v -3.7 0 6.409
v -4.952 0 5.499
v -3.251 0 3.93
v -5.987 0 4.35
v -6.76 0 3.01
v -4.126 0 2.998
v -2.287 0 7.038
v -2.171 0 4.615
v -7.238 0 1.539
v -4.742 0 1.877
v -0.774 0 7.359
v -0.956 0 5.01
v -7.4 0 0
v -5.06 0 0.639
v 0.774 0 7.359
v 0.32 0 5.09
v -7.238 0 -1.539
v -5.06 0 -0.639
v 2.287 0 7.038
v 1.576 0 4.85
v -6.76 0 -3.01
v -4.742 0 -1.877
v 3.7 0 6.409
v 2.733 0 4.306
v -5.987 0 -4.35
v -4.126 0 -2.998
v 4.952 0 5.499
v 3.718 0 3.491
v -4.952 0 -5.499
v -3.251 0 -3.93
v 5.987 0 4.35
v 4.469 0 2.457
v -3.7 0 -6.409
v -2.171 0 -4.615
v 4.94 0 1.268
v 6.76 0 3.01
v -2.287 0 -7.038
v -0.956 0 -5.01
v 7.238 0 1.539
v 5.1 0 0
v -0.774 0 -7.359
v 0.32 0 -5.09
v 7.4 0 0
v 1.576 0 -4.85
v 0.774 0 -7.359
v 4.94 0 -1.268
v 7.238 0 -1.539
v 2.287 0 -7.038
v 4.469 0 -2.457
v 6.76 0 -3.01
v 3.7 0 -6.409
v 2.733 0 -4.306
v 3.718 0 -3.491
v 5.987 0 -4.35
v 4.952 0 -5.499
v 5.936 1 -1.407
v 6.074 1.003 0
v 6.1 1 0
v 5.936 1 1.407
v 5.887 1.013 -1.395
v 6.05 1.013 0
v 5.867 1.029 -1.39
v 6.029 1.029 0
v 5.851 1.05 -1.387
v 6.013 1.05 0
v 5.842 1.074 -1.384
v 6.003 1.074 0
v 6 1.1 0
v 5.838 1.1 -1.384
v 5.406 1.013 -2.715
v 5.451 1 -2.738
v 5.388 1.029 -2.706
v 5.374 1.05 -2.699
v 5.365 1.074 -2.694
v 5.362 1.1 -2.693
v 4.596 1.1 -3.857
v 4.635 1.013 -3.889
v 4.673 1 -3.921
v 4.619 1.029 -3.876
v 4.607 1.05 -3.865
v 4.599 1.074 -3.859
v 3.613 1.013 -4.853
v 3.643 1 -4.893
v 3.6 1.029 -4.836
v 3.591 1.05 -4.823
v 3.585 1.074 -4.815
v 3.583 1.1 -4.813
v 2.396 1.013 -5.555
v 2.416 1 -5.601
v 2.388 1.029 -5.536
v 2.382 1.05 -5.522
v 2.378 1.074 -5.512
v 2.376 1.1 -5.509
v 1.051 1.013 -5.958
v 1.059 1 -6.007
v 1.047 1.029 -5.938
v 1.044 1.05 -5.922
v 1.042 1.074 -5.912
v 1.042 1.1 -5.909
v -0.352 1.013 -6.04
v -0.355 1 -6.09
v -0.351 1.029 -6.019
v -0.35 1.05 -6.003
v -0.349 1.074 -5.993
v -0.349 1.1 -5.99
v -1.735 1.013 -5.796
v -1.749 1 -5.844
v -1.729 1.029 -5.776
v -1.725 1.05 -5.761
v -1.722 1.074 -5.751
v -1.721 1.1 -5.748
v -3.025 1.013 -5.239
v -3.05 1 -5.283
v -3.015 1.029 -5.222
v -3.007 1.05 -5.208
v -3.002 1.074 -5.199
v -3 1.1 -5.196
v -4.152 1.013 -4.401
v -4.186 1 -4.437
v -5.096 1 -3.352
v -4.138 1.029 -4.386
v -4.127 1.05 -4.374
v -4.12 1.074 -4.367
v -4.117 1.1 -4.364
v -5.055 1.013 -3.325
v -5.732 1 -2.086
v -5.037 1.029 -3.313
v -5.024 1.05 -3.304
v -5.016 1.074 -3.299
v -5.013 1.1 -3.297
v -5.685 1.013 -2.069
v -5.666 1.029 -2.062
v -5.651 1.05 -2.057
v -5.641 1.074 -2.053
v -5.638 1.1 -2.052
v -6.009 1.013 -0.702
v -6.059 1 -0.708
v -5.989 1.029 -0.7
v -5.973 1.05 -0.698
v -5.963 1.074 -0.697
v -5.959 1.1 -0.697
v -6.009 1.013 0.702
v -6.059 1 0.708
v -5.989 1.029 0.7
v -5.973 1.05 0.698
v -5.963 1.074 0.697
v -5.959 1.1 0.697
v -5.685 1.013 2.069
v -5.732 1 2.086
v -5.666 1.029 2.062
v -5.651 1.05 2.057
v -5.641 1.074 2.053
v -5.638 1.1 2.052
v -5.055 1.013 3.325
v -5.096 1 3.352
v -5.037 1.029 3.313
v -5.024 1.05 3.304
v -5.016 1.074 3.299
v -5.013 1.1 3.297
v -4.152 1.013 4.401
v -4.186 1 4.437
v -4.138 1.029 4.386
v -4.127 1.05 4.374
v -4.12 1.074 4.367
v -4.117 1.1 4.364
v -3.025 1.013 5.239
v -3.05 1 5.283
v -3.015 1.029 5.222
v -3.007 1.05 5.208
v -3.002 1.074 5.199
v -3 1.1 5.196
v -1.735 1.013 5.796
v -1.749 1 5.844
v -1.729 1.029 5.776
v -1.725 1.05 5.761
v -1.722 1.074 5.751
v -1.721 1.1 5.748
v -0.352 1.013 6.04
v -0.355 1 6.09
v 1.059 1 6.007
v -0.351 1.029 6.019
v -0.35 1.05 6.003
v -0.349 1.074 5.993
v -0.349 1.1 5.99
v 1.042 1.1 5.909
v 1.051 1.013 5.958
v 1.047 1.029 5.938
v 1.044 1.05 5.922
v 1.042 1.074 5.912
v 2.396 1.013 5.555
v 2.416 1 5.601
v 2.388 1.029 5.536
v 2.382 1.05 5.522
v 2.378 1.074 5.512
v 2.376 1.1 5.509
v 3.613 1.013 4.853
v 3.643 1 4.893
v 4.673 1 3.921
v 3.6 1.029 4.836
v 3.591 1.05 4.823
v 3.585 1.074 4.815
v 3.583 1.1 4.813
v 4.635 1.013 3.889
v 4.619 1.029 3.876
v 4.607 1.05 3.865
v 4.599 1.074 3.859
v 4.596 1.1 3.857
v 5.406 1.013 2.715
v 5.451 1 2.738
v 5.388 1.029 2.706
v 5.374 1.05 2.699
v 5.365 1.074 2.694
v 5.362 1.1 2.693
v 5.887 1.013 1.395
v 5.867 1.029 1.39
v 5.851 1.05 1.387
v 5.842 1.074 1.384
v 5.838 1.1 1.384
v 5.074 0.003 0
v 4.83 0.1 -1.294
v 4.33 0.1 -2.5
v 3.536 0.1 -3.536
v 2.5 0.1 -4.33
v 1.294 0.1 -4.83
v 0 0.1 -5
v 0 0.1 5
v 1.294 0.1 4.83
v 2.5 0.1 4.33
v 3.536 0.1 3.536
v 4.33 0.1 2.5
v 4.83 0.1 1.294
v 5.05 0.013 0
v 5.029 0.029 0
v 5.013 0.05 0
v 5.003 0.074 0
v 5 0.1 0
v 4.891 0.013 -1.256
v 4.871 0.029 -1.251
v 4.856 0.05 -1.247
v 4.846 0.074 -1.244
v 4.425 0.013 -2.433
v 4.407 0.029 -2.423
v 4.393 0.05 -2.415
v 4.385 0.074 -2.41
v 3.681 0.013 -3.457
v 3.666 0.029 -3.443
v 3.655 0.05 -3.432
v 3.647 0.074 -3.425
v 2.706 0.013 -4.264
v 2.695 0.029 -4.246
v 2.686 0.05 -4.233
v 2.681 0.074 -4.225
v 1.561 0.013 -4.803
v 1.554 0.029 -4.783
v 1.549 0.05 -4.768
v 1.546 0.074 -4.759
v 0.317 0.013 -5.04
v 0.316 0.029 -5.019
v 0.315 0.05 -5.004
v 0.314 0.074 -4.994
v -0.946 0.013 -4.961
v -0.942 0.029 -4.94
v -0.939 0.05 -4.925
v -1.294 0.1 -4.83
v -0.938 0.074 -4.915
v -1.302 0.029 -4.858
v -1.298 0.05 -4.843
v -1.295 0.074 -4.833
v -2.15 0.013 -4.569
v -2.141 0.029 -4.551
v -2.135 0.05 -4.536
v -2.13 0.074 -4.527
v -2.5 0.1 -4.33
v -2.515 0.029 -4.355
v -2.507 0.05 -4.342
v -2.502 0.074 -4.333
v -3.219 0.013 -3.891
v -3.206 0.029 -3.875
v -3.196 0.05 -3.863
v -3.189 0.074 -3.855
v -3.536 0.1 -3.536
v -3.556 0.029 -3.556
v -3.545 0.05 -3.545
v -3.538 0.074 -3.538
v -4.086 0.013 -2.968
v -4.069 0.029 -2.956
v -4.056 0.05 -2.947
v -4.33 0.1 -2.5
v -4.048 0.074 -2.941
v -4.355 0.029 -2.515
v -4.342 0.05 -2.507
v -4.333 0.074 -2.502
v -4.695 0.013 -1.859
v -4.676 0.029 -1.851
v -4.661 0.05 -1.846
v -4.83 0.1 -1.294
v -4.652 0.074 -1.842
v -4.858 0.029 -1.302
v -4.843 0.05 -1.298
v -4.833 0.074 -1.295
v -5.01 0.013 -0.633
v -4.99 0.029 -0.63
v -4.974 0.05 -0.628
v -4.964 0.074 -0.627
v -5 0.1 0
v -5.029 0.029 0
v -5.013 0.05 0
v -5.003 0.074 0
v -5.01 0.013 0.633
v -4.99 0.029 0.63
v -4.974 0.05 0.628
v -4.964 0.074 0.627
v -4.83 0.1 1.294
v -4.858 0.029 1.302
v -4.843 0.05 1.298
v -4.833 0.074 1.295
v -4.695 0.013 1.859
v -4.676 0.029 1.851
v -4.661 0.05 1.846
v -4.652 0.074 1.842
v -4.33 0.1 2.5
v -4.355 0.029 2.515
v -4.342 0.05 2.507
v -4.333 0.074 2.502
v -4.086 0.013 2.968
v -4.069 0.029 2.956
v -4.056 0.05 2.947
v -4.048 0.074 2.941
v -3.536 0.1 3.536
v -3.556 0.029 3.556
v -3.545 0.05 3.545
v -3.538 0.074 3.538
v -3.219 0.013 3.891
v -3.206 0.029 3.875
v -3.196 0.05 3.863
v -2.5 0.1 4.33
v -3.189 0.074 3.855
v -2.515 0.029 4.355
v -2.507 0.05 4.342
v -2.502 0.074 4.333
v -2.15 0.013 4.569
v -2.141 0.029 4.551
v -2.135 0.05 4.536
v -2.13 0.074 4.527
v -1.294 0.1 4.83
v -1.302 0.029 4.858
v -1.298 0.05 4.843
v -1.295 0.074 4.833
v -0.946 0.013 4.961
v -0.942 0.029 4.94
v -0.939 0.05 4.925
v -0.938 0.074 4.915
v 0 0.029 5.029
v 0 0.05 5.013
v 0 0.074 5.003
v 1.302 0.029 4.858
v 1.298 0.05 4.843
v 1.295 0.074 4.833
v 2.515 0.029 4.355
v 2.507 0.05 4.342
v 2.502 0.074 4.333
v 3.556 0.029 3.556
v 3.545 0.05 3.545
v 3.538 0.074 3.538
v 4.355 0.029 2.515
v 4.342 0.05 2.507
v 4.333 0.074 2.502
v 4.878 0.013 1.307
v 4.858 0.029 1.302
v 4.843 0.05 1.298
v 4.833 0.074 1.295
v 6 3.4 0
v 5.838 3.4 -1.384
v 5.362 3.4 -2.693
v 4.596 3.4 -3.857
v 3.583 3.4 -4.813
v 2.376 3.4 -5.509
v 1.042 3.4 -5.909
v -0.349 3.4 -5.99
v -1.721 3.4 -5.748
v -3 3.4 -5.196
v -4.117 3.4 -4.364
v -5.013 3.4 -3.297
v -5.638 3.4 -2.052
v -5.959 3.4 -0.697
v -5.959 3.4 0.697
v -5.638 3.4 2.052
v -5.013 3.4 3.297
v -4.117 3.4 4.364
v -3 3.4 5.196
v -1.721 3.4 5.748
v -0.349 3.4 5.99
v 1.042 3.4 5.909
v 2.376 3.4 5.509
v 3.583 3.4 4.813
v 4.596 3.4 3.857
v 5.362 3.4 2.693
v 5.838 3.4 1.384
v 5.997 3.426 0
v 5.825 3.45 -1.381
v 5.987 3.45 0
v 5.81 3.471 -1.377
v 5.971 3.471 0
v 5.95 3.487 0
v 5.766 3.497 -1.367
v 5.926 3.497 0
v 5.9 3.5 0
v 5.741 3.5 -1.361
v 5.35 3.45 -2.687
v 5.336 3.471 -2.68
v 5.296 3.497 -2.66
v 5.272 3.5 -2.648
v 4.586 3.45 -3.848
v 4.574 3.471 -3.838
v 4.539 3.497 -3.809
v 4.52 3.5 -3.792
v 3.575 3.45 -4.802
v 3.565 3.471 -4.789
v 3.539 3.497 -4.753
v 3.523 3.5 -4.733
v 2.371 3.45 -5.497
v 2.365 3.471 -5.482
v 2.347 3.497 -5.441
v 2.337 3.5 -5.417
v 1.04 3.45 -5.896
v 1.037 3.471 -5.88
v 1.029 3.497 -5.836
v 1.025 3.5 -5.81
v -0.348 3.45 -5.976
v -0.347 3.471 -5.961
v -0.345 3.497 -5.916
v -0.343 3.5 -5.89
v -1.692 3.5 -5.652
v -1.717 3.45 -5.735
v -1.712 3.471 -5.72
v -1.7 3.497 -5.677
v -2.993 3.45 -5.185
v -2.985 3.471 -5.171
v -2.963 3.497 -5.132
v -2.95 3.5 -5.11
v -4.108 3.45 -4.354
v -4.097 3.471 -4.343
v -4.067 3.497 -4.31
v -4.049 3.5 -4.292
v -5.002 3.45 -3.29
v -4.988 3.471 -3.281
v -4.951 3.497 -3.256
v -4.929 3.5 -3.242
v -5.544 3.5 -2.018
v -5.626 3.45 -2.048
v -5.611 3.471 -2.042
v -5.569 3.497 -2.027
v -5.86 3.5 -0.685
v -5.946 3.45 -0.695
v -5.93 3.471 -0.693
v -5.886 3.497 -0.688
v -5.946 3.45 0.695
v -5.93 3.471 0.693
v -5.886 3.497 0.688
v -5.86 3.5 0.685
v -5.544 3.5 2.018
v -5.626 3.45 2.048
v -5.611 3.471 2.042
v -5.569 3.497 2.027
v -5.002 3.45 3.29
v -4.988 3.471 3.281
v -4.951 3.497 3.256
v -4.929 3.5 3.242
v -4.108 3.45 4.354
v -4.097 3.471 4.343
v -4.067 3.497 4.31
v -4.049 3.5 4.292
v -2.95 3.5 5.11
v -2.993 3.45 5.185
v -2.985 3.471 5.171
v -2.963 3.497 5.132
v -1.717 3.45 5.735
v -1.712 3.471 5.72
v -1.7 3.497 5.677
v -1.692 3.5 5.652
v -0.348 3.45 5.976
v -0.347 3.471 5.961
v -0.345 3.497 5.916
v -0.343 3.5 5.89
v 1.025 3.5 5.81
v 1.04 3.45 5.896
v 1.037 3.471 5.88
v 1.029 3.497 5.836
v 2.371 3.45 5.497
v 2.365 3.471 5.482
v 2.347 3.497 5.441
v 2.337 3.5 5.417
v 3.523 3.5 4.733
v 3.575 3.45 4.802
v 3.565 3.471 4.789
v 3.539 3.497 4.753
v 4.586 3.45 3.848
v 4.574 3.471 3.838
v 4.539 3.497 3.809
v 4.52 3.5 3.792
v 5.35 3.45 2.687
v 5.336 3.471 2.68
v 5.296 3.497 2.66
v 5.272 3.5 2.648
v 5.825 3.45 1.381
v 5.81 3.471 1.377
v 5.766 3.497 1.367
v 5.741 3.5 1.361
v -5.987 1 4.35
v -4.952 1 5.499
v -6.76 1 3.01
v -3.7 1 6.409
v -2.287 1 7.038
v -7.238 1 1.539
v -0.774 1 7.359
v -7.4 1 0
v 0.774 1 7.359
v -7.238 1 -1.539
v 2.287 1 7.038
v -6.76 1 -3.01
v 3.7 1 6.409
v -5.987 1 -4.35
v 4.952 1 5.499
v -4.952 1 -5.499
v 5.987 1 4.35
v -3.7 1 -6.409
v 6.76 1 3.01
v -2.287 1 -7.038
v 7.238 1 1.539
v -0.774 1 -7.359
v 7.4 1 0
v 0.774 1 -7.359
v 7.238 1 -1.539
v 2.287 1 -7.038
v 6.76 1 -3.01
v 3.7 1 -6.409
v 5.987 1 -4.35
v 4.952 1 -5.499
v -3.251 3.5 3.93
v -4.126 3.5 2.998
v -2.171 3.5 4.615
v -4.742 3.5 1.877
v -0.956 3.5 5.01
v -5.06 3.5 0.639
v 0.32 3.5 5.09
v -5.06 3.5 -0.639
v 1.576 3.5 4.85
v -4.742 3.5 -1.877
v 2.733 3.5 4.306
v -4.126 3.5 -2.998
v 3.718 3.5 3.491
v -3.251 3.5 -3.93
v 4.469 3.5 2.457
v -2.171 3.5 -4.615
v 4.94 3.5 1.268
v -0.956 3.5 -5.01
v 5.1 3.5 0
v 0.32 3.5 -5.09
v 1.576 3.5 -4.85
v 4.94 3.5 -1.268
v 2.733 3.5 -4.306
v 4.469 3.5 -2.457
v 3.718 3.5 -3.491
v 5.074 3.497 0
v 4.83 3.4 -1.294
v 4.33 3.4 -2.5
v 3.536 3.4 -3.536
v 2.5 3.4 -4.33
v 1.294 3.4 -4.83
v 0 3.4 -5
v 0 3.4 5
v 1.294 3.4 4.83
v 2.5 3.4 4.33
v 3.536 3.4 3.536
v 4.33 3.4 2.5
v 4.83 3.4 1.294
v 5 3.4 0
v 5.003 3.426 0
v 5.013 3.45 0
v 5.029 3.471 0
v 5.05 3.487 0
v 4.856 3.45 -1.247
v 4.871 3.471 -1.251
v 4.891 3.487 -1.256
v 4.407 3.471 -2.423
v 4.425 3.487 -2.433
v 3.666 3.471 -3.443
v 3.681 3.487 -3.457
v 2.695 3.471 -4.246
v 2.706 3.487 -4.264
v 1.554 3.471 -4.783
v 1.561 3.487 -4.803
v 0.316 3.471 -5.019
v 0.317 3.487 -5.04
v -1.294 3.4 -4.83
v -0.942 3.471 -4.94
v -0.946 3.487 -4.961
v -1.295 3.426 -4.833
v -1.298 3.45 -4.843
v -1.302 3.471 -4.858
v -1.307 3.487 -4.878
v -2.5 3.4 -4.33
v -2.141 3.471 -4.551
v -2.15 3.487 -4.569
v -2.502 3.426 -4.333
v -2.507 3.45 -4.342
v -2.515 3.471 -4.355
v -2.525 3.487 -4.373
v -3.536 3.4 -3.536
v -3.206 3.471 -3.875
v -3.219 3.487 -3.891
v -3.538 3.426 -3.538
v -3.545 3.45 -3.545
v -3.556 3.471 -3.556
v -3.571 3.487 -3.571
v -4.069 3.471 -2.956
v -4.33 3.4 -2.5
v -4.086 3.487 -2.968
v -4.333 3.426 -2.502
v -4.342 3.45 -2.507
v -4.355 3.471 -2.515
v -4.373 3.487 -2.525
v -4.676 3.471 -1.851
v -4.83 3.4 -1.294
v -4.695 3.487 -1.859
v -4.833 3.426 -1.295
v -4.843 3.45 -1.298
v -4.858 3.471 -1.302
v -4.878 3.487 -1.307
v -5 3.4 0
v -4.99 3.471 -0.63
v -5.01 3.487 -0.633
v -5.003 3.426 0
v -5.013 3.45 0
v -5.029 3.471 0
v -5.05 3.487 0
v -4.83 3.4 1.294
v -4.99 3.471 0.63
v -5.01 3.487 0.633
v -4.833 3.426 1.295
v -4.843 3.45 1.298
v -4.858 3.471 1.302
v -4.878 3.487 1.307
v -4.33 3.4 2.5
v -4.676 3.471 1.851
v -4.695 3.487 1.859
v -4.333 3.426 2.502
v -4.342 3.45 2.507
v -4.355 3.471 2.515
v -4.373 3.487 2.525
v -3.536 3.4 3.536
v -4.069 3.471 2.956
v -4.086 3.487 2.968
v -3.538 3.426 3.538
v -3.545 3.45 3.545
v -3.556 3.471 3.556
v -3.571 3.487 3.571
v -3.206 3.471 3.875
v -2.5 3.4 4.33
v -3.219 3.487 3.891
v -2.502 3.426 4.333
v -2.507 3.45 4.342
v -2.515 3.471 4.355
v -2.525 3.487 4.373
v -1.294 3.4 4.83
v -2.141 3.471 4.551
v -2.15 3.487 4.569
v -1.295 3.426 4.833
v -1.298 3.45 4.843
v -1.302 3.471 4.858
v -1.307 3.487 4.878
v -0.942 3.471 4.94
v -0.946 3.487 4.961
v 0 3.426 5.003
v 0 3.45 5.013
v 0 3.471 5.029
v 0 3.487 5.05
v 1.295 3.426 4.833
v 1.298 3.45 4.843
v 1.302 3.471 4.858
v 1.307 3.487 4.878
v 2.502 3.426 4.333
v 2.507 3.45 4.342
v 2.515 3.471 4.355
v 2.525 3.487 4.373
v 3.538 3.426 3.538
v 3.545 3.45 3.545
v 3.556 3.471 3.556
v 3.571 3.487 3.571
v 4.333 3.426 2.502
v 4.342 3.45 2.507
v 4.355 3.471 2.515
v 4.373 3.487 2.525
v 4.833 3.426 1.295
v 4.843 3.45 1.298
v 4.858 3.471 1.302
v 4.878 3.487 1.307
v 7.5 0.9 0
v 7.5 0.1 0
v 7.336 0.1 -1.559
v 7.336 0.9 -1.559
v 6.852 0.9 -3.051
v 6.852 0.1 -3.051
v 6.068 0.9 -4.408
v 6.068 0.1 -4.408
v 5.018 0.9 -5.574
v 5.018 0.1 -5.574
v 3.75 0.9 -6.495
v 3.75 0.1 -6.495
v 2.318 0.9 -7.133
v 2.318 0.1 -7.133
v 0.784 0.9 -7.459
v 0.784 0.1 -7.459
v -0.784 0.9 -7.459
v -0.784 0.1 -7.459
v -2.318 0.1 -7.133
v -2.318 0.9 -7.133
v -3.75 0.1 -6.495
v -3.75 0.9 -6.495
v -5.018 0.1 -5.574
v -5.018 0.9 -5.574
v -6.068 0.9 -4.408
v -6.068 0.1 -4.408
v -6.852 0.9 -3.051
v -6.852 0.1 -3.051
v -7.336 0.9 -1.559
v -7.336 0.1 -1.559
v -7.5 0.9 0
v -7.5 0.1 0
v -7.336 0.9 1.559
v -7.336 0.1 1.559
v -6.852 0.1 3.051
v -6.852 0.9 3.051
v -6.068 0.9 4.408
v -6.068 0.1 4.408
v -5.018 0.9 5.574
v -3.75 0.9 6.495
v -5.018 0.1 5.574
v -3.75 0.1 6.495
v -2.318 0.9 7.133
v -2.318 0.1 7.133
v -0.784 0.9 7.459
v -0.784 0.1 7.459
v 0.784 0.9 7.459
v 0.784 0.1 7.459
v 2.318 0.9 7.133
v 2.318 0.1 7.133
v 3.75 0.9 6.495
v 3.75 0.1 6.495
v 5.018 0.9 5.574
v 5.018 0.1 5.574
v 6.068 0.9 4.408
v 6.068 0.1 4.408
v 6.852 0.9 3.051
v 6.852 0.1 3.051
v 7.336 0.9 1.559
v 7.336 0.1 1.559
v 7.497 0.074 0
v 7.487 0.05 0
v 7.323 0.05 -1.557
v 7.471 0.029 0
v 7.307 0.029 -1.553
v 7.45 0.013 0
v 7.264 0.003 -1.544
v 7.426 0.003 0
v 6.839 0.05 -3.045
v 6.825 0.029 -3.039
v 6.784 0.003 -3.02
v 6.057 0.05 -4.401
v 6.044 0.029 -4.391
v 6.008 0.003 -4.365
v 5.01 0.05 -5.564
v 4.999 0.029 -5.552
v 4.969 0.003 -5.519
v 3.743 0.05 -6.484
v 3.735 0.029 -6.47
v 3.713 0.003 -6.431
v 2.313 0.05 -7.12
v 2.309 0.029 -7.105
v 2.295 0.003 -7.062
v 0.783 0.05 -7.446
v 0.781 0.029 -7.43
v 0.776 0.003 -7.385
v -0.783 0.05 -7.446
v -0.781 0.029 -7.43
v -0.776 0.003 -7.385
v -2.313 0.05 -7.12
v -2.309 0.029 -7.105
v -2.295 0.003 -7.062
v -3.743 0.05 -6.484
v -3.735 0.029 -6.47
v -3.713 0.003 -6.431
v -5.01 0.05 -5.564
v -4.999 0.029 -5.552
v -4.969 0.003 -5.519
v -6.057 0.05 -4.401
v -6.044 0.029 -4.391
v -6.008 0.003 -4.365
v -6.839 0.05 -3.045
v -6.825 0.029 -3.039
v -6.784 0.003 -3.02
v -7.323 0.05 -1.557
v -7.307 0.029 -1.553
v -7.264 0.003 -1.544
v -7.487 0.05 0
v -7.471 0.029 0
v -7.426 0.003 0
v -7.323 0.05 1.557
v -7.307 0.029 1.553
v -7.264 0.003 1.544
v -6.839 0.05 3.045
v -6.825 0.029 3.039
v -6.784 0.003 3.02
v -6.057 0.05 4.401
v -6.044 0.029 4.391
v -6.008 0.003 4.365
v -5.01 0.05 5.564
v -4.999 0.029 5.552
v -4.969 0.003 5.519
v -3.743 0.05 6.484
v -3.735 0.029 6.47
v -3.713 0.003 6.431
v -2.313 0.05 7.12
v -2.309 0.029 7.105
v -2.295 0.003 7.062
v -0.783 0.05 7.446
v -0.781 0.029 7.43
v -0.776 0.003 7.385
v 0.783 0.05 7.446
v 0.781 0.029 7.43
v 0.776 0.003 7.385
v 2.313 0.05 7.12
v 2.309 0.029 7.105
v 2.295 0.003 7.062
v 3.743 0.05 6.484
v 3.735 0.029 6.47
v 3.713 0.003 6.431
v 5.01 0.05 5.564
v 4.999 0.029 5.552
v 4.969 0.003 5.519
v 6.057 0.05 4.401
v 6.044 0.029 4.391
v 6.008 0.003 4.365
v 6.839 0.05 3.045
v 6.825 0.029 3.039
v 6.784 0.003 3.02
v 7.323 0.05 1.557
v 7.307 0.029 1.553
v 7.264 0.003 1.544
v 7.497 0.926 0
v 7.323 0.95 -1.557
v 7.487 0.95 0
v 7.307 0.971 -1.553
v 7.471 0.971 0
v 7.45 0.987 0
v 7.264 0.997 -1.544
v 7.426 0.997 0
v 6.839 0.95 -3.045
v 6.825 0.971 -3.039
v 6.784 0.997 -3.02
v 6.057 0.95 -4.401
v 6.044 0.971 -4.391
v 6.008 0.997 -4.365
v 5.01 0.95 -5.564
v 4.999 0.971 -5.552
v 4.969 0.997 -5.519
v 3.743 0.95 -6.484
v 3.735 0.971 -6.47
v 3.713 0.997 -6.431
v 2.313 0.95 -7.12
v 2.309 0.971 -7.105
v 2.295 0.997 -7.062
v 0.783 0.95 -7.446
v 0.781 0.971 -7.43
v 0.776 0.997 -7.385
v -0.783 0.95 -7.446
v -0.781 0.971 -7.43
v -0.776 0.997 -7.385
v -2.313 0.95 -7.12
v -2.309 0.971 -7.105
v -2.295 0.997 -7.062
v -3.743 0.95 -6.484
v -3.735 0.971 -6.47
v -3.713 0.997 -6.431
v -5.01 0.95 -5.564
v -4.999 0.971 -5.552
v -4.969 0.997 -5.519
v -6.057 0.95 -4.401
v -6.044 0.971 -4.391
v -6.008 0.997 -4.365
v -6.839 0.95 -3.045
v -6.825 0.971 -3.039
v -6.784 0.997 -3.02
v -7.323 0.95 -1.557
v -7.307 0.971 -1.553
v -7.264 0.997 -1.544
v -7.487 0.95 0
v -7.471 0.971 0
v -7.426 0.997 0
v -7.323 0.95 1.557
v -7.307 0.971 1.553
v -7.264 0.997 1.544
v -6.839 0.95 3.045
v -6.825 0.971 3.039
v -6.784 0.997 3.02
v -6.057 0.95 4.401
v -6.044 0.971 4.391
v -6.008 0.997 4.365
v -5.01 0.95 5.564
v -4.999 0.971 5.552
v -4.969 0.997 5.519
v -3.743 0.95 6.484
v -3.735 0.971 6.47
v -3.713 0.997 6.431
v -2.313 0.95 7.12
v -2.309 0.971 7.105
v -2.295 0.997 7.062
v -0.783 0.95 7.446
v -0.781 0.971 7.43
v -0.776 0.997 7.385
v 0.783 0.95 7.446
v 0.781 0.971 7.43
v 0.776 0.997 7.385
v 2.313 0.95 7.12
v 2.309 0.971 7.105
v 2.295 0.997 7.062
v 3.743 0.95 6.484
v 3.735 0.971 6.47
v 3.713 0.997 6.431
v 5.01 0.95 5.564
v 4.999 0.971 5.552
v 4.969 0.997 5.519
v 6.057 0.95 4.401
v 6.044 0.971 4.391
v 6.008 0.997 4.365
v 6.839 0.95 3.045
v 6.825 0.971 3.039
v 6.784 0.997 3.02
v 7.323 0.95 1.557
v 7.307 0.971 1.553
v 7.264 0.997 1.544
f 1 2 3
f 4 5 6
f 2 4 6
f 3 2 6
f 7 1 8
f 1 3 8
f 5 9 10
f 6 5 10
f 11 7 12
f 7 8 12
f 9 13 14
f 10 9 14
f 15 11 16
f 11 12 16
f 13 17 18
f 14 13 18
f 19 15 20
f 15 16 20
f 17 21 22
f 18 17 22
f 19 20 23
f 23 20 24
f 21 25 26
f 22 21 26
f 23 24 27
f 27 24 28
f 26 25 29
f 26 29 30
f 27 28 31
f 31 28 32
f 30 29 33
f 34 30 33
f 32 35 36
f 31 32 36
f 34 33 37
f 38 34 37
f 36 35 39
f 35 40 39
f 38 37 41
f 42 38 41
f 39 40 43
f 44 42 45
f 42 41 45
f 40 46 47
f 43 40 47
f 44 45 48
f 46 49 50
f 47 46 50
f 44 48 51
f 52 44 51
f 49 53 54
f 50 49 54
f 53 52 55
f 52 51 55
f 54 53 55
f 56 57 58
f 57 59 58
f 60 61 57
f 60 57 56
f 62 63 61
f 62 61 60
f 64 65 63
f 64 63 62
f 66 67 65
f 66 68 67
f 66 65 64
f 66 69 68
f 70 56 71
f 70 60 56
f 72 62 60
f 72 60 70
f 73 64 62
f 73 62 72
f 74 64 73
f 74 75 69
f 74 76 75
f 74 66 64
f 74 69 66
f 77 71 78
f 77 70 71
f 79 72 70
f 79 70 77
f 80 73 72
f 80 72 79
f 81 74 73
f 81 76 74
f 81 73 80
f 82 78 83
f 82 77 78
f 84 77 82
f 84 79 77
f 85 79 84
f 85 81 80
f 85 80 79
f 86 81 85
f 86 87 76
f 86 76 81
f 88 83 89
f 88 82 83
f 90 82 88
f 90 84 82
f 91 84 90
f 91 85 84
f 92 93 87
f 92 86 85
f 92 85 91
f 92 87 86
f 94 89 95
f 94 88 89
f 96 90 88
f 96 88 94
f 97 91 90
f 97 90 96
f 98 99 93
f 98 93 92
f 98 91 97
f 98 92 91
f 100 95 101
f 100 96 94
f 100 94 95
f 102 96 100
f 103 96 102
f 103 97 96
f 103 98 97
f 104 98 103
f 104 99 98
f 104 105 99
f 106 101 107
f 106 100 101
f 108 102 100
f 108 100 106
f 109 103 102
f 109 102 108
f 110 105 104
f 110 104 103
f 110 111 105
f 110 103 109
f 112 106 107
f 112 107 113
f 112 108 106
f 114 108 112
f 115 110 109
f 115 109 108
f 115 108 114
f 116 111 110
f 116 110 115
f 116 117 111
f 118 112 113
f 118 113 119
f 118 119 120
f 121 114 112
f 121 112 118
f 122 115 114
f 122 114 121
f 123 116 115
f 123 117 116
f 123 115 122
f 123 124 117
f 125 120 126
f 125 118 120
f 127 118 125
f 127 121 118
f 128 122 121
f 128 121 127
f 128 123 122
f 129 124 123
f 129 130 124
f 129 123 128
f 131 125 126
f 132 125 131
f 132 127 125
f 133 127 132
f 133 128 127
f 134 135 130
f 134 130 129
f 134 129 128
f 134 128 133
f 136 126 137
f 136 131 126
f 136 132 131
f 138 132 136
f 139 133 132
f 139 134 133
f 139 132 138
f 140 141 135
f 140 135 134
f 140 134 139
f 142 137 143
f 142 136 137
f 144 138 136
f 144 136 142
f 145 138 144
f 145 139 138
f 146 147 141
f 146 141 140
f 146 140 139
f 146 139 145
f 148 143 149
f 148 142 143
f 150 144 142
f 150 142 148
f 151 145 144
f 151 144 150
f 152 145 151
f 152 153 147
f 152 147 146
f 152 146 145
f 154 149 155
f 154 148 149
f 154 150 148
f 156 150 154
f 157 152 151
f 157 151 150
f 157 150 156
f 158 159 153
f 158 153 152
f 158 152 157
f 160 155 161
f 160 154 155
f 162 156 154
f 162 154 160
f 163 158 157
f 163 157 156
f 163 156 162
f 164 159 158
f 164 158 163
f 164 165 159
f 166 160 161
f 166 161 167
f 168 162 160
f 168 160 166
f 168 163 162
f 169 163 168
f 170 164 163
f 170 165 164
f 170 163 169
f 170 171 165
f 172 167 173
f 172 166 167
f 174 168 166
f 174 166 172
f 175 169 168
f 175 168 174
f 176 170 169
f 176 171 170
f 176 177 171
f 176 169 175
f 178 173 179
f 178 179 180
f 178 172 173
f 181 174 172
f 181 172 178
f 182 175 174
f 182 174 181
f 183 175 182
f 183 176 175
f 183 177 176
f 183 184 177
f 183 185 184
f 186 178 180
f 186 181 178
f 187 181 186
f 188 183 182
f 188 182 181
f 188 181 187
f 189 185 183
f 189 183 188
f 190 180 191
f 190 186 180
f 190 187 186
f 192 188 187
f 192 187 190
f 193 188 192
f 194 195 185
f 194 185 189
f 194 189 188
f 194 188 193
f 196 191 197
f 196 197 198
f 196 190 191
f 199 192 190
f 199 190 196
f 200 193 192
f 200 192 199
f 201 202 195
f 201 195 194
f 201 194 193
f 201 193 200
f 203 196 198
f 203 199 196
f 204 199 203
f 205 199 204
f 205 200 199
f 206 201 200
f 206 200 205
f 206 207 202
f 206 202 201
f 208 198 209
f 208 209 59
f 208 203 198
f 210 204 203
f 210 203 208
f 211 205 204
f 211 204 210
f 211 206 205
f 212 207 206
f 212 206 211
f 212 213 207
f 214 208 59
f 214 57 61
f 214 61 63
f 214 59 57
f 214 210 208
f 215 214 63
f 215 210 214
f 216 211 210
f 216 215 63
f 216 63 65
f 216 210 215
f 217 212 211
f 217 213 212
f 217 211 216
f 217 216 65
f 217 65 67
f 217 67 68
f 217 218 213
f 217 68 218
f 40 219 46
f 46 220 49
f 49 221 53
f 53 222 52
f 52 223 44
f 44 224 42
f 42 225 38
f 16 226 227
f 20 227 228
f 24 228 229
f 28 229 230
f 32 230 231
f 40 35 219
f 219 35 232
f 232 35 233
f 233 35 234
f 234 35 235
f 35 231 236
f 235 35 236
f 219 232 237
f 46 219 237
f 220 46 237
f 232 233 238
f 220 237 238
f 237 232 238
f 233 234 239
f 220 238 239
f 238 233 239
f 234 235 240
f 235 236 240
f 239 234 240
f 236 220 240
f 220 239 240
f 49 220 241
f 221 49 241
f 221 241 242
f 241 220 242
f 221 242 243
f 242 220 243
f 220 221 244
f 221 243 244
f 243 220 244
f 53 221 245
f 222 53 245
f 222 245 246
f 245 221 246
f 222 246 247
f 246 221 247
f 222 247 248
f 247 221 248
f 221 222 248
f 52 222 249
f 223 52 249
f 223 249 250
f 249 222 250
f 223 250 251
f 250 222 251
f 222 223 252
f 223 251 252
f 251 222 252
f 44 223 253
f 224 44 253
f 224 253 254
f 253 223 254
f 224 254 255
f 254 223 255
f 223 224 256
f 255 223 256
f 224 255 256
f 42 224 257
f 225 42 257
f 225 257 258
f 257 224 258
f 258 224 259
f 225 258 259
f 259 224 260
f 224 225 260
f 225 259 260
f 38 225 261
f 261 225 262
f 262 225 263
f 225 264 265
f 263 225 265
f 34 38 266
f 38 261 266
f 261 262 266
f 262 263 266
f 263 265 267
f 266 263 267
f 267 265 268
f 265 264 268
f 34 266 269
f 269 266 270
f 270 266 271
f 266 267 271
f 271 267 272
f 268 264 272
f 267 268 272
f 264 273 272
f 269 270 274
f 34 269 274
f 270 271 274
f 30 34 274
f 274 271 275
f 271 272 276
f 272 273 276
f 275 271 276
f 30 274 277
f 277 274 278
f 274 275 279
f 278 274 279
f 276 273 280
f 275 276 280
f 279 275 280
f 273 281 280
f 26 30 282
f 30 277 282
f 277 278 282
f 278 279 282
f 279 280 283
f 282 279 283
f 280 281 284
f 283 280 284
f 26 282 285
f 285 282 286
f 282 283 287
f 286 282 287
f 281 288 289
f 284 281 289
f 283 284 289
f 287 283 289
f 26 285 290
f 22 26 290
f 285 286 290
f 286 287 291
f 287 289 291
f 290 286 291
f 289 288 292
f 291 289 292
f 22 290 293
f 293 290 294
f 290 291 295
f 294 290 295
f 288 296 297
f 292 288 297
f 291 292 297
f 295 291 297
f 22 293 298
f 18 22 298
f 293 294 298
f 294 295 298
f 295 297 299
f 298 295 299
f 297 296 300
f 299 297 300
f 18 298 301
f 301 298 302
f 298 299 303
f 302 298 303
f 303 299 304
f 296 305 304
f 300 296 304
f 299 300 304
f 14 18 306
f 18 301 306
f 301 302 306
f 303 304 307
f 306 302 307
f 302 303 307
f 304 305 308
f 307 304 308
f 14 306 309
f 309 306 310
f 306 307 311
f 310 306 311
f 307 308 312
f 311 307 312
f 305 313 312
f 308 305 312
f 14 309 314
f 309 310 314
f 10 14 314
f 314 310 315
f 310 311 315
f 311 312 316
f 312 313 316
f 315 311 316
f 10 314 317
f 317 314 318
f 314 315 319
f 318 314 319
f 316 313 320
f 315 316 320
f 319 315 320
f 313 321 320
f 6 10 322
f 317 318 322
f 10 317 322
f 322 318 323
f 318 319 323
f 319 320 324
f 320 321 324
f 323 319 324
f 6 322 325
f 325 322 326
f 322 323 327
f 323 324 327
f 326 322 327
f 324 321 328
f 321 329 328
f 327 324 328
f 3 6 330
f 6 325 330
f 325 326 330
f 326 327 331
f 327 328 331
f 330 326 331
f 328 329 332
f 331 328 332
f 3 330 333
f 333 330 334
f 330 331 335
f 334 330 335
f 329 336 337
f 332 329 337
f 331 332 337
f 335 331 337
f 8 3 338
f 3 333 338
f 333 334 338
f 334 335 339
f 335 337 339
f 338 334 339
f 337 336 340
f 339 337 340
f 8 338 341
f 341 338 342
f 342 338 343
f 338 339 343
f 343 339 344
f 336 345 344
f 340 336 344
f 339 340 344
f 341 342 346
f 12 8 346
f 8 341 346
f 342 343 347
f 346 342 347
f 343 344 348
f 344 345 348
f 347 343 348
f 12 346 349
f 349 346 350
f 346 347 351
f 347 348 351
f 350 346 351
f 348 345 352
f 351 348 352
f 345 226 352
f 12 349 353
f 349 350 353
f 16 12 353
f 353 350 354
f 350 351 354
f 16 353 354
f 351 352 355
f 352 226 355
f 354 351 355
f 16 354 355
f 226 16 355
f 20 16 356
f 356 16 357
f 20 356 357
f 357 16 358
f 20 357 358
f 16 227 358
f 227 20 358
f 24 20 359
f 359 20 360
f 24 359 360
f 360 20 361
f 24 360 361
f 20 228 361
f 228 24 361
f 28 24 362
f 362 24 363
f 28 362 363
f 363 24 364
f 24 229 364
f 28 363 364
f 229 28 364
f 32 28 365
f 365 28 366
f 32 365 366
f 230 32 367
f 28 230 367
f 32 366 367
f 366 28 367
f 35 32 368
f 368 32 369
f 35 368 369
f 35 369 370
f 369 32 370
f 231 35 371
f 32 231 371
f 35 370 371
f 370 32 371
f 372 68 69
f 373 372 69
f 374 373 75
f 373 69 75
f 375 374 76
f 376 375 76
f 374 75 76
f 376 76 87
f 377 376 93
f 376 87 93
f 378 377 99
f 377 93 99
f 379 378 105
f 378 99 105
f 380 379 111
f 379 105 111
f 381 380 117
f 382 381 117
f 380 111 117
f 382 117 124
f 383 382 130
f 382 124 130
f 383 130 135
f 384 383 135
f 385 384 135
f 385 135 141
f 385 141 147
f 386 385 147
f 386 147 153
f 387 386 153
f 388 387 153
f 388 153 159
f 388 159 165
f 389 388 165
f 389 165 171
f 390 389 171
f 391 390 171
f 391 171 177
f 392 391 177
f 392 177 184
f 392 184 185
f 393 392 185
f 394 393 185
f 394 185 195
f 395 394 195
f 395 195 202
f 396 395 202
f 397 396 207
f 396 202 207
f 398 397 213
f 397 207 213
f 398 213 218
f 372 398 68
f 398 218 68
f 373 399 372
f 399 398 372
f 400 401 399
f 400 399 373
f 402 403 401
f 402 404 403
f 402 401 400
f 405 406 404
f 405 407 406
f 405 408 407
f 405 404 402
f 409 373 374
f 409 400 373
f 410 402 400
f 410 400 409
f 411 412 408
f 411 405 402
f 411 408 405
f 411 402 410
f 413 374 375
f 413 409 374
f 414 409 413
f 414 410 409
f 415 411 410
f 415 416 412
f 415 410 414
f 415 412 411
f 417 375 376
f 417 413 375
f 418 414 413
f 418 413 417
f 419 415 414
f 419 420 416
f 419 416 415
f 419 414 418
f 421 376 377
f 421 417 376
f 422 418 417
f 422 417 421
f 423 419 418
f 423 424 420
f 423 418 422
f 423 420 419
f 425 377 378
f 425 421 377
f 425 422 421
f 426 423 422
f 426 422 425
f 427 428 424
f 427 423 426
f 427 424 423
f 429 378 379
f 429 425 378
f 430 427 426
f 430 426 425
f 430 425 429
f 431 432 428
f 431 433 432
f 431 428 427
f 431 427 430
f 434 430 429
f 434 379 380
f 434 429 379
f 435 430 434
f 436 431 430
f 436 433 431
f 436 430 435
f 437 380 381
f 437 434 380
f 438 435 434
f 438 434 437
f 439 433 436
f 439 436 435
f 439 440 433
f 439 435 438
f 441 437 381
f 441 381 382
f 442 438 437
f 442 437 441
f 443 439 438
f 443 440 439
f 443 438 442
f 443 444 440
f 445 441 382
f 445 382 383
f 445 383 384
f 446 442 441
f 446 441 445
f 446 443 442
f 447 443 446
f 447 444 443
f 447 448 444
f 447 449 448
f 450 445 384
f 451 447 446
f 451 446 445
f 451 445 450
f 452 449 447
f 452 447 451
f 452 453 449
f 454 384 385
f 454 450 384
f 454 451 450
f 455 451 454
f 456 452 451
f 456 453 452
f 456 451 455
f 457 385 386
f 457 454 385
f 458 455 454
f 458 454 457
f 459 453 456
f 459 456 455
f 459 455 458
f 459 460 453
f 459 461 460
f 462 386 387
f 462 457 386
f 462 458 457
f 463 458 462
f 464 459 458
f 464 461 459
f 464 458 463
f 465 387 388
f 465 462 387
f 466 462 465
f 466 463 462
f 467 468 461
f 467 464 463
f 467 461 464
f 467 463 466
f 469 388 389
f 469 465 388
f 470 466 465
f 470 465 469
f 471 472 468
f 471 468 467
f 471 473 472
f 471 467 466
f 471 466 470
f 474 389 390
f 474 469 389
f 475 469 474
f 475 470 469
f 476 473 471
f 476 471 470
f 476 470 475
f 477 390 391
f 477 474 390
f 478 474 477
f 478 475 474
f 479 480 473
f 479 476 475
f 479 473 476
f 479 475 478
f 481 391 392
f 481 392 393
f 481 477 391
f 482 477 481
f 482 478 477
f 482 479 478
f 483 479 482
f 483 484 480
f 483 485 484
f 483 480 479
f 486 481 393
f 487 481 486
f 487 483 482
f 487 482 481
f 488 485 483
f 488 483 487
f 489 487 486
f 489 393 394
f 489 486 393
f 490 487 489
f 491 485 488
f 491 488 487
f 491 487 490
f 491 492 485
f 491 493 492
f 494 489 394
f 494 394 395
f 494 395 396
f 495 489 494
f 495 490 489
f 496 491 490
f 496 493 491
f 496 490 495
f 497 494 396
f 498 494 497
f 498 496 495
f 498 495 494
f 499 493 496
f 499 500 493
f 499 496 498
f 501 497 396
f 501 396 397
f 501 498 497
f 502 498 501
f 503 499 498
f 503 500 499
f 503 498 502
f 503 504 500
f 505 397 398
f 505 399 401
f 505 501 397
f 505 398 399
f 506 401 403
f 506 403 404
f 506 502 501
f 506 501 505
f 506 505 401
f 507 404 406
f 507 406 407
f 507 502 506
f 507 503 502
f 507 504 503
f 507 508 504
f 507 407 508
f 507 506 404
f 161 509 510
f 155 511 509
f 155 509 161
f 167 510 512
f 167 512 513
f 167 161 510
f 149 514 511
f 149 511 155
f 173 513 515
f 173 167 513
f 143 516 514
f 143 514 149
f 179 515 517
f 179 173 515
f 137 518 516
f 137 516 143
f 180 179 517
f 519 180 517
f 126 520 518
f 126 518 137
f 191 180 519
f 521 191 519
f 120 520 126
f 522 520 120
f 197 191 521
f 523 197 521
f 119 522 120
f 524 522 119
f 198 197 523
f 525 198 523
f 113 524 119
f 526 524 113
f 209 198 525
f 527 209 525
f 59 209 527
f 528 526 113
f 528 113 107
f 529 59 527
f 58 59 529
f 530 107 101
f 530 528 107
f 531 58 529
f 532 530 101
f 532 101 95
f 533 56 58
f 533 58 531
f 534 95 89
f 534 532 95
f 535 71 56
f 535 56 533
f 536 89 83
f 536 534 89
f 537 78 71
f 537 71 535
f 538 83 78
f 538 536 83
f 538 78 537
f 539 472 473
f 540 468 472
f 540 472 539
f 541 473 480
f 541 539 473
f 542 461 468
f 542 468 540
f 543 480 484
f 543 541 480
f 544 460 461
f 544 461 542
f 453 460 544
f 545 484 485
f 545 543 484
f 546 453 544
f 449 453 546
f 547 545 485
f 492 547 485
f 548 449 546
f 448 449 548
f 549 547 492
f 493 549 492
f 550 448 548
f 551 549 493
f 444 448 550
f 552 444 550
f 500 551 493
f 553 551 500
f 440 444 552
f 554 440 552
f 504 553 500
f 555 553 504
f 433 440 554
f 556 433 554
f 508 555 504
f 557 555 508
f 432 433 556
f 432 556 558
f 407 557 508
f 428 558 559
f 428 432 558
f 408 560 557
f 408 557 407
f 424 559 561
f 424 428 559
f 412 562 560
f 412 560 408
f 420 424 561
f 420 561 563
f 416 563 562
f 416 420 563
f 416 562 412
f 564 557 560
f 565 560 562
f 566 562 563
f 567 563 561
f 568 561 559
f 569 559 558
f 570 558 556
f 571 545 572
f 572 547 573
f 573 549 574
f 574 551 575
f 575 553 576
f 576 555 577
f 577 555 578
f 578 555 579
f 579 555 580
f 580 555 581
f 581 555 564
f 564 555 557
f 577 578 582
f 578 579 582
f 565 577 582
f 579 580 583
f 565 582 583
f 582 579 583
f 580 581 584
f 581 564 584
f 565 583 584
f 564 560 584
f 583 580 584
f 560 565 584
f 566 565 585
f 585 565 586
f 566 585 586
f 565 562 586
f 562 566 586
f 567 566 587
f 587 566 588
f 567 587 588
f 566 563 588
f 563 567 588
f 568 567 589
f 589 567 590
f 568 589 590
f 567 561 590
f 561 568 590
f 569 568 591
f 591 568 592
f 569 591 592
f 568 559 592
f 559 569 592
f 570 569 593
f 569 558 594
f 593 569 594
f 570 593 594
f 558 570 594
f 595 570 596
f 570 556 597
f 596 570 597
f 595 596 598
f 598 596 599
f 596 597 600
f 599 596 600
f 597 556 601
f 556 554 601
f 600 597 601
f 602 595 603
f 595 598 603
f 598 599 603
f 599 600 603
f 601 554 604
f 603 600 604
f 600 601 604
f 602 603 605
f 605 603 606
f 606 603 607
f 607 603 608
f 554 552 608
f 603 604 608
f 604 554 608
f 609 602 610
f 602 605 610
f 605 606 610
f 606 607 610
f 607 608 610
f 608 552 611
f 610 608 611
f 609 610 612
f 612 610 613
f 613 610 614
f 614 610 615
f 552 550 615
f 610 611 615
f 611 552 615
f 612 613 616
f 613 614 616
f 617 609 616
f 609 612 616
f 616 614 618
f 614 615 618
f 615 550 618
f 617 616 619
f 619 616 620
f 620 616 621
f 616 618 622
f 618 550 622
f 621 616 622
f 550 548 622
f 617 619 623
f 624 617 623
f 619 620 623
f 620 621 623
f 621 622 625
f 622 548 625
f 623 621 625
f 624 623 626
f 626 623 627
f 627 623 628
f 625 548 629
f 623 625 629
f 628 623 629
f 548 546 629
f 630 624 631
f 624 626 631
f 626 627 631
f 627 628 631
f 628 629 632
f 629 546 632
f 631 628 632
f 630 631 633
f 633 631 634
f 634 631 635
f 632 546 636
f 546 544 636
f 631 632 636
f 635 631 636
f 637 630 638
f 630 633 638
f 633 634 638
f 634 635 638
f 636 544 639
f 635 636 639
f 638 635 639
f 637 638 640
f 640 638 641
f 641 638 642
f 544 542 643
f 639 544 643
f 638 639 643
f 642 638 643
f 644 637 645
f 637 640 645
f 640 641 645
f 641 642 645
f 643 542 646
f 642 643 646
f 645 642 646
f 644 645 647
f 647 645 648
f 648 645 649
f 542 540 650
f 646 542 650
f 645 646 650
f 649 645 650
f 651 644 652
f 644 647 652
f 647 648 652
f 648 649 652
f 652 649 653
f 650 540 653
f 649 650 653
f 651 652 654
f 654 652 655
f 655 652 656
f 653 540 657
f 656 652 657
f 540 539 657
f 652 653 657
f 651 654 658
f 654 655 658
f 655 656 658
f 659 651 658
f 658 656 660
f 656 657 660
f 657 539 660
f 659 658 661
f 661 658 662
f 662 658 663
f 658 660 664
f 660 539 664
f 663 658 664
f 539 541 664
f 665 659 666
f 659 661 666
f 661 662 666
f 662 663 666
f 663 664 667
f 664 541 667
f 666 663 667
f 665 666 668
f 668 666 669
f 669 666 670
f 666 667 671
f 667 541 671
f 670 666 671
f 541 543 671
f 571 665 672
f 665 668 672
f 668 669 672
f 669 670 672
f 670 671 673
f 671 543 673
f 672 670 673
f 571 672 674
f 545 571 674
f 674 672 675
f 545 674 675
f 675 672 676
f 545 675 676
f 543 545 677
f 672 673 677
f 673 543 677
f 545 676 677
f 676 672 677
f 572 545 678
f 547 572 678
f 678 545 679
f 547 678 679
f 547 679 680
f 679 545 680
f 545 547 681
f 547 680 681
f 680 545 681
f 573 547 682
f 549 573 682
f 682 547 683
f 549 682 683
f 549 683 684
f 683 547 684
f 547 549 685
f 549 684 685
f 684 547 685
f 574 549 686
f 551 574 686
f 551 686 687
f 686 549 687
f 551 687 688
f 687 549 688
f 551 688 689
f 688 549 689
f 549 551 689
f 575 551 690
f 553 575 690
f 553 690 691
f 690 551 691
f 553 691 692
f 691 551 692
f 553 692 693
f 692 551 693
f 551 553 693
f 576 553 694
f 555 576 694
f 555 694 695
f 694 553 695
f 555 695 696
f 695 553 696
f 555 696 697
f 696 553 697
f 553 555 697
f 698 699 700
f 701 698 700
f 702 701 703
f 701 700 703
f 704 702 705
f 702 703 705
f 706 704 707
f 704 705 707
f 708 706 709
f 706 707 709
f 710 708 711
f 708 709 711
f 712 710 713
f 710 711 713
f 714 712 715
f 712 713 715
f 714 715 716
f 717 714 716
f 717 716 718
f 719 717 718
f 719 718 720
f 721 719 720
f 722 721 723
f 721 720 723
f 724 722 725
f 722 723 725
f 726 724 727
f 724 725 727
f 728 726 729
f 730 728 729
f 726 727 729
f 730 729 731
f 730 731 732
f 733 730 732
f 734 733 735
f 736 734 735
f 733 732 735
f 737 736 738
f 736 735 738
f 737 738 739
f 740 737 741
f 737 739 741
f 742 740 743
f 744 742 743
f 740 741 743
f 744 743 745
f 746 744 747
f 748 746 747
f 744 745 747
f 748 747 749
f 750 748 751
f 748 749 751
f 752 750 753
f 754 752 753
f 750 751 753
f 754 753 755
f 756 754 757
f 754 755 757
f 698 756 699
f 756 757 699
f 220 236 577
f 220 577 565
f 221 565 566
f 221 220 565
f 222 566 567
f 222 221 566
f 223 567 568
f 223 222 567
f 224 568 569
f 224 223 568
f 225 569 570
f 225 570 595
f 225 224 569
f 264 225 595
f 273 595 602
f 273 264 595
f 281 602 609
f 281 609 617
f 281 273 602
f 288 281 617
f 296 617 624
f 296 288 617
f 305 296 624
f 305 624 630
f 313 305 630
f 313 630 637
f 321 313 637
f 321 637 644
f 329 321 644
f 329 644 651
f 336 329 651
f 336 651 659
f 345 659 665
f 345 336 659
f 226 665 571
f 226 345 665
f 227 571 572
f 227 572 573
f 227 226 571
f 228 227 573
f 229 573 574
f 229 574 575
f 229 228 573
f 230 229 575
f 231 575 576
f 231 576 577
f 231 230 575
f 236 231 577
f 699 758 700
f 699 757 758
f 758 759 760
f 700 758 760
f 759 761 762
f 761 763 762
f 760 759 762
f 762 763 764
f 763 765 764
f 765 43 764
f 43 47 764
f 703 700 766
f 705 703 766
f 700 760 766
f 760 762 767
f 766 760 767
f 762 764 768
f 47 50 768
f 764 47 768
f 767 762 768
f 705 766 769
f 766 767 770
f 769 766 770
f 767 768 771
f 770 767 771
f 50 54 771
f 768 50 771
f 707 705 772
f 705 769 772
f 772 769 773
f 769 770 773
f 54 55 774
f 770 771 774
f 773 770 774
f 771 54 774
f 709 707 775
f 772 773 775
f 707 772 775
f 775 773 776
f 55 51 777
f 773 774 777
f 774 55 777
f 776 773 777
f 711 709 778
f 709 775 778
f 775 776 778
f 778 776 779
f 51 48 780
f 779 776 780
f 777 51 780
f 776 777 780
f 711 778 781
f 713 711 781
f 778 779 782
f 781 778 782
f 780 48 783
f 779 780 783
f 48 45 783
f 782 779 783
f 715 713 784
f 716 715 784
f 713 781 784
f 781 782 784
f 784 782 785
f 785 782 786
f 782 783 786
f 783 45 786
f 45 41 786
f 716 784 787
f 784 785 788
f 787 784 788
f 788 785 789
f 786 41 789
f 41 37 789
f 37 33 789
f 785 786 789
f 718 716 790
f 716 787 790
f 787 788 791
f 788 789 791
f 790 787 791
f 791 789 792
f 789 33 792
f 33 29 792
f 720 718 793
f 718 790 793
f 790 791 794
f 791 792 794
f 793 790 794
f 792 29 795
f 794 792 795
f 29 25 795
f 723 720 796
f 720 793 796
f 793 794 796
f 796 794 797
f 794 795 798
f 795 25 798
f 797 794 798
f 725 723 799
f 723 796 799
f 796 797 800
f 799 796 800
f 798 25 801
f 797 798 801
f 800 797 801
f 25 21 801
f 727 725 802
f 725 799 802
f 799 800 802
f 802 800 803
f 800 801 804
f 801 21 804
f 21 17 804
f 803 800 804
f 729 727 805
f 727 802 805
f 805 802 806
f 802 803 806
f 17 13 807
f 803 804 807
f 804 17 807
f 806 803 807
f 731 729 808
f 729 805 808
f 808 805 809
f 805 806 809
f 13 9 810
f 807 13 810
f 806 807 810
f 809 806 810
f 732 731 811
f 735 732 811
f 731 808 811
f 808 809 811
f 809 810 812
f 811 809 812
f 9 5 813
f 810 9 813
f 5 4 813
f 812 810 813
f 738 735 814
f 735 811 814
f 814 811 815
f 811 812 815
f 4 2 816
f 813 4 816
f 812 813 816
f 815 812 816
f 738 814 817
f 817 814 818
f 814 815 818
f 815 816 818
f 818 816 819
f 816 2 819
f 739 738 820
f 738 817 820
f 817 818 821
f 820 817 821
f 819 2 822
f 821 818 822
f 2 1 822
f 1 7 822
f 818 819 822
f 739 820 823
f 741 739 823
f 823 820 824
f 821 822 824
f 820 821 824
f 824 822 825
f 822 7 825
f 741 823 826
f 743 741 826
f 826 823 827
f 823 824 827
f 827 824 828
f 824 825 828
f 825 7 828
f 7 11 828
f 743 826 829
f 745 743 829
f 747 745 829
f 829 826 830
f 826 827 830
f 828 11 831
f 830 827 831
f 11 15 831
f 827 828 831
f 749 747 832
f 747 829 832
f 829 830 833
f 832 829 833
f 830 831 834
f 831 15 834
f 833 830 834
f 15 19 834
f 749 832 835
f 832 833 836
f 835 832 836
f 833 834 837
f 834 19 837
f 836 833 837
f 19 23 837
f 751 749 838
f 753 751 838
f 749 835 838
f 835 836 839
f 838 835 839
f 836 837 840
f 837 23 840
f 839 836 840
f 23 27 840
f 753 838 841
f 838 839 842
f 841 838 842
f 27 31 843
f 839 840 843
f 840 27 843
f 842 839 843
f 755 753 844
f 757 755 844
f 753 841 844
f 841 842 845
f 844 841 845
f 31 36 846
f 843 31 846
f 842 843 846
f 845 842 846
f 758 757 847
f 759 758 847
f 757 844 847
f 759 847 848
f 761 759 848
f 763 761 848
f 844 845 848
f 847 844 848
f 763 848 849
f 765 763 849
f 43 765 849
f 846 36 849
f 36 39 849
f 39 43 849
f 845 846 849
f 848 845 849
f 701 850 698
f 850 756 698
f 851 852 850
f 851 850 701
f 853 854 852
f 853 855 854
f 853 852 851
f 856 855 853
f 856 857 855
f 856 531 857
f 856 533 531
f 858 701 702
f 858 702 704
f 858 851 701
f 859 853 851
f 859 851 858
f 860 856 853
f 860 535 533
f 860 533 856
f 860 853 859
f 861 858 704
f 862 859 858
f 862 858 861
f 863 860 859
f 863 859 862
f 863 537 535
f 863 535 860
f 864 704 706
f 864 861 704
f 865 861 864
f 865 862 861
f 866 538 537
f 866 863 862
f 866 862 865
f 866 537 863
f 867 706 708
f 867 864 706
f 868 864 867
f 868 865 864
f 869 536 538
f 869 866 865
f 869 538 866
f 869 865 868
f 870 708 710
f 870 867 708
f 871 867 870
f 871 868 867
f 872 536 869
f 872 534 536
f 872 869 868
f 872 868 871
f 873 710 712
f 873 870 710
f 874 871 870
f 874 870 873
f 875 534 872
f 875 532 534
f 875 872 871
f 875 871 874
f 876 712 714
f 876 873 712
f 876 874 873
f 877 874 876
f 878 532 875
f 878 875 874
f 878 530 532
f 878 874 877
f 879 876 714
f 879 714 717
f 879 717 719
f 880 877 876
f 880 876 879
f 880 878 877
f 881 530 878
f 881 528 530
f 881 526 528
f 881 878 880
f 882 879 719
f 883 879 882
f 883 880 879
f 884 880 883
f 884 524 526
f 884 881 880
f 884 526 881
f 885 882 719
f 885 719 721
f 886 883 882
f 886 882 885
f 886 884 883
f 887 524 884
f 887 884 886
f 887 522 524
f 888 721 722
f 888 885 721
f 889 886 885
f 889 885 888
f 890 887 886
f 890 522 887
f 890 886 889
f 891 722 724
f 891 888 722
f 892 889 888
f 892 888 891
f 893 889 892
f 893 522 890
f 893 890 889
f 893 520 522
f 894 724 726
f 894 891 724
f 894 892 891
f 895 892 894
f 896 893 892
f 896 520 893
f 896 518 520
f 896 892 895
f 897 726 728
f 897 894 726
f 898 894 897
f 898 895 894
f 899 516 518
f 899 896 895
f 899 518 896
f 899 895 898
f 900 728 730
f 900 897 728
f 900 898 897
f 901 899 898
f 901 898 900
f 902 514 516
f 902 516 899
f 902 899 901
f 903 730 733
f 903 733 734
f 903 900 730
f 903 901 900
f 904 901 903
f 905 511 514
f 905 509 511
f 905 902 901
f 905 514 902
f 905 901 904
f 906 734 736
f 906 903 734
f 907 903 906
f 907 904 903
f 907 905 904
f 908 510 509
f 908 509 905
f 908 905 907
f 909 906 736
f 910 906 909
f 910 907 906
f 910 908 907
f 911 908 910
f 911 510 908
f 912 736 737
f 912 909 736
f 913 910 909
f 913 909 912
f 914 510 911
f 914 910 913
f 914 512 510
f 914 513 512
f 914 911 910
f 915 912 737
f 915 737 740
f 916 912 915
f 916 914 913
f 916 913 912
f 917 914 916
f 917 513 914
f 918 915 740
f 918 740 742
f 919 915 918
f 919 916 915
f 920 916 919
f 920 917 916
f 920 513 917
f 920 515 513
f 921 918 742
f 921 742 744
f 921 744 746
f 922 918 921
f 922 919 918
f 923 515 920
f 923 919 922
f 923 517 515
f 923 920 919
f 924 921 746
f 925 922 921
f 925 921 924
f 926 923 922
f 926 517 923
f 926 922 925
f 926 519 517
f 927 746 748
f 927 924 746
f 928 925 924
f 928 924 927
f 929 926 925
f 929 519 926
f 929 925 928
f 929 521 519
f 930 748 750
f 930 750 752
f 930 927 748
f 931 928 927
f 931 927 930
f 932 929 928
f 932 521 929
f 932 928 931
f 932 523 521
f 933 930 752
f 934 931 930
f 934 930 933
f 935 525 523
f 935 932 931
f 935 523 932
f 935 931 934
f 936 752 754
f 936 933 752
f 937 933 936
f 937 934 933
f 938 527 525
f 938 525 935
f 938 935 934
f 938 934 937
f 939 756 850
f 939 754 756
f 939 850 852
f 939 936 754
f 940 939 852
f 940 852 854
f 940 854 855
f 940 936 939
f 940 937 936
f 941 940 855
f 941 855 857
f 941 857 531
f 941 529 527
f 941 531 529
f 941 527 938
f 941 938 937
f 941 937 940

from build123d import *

# Parameters (mm, degrees)
SKETCH3_R           = 6
SKETCH3_R_2         = 5
BOSS_EXTRUDE1_DEPTH = 3.5
SKETCH4_R           = 7.5
SKETCH4_R_2         = 6
BOSS_EXTRUDE2_DEPTH = 1
FILLET1_R           = 0.1


with BuildPart() as part:
    # Sketch3 → Boss-Extrude1 (new body)
    with BuildSketch(Plane(origin=(0, 0, 0), x_dir=(1, 0, 0), z_dir=(0, 1, 0))):
        Circle(SKETCH3_R)
        Circle(SKETCH3_R_2, mode=Mode.SUBTRACT)
    extrude(amount=BOSS_EXTRUDE1_DEPTH)

    # Sketch4 → Boss-Extrude2 (add)
    with BuildSketch(Plane(origin=(0, 0, 0), x_dir=(1, 0, 0), z_dir=(0, 1, 0))):
        Circle(SKETCH4_R)
        Circle(SKETCH4_R_2, mode=Mode.SUBTRACT)
    extrude(amount=BOSS_EXTRUDE2_DEPTH)

    # Fillet1
    fillet1_edges = [part.edges().sort_by_distance(p)[0] for p in [
        (-7.5, 0, 0),
        (-6, 1, 0),
        (-6, 3.5, 0),
        (-5, 0, 0),
        (-5, 3.5, 0),
        (-7.5, 1, 0),
    ]]
    fillet(fillet1_edges, radius=FILLET1_R)


solid = part.part
